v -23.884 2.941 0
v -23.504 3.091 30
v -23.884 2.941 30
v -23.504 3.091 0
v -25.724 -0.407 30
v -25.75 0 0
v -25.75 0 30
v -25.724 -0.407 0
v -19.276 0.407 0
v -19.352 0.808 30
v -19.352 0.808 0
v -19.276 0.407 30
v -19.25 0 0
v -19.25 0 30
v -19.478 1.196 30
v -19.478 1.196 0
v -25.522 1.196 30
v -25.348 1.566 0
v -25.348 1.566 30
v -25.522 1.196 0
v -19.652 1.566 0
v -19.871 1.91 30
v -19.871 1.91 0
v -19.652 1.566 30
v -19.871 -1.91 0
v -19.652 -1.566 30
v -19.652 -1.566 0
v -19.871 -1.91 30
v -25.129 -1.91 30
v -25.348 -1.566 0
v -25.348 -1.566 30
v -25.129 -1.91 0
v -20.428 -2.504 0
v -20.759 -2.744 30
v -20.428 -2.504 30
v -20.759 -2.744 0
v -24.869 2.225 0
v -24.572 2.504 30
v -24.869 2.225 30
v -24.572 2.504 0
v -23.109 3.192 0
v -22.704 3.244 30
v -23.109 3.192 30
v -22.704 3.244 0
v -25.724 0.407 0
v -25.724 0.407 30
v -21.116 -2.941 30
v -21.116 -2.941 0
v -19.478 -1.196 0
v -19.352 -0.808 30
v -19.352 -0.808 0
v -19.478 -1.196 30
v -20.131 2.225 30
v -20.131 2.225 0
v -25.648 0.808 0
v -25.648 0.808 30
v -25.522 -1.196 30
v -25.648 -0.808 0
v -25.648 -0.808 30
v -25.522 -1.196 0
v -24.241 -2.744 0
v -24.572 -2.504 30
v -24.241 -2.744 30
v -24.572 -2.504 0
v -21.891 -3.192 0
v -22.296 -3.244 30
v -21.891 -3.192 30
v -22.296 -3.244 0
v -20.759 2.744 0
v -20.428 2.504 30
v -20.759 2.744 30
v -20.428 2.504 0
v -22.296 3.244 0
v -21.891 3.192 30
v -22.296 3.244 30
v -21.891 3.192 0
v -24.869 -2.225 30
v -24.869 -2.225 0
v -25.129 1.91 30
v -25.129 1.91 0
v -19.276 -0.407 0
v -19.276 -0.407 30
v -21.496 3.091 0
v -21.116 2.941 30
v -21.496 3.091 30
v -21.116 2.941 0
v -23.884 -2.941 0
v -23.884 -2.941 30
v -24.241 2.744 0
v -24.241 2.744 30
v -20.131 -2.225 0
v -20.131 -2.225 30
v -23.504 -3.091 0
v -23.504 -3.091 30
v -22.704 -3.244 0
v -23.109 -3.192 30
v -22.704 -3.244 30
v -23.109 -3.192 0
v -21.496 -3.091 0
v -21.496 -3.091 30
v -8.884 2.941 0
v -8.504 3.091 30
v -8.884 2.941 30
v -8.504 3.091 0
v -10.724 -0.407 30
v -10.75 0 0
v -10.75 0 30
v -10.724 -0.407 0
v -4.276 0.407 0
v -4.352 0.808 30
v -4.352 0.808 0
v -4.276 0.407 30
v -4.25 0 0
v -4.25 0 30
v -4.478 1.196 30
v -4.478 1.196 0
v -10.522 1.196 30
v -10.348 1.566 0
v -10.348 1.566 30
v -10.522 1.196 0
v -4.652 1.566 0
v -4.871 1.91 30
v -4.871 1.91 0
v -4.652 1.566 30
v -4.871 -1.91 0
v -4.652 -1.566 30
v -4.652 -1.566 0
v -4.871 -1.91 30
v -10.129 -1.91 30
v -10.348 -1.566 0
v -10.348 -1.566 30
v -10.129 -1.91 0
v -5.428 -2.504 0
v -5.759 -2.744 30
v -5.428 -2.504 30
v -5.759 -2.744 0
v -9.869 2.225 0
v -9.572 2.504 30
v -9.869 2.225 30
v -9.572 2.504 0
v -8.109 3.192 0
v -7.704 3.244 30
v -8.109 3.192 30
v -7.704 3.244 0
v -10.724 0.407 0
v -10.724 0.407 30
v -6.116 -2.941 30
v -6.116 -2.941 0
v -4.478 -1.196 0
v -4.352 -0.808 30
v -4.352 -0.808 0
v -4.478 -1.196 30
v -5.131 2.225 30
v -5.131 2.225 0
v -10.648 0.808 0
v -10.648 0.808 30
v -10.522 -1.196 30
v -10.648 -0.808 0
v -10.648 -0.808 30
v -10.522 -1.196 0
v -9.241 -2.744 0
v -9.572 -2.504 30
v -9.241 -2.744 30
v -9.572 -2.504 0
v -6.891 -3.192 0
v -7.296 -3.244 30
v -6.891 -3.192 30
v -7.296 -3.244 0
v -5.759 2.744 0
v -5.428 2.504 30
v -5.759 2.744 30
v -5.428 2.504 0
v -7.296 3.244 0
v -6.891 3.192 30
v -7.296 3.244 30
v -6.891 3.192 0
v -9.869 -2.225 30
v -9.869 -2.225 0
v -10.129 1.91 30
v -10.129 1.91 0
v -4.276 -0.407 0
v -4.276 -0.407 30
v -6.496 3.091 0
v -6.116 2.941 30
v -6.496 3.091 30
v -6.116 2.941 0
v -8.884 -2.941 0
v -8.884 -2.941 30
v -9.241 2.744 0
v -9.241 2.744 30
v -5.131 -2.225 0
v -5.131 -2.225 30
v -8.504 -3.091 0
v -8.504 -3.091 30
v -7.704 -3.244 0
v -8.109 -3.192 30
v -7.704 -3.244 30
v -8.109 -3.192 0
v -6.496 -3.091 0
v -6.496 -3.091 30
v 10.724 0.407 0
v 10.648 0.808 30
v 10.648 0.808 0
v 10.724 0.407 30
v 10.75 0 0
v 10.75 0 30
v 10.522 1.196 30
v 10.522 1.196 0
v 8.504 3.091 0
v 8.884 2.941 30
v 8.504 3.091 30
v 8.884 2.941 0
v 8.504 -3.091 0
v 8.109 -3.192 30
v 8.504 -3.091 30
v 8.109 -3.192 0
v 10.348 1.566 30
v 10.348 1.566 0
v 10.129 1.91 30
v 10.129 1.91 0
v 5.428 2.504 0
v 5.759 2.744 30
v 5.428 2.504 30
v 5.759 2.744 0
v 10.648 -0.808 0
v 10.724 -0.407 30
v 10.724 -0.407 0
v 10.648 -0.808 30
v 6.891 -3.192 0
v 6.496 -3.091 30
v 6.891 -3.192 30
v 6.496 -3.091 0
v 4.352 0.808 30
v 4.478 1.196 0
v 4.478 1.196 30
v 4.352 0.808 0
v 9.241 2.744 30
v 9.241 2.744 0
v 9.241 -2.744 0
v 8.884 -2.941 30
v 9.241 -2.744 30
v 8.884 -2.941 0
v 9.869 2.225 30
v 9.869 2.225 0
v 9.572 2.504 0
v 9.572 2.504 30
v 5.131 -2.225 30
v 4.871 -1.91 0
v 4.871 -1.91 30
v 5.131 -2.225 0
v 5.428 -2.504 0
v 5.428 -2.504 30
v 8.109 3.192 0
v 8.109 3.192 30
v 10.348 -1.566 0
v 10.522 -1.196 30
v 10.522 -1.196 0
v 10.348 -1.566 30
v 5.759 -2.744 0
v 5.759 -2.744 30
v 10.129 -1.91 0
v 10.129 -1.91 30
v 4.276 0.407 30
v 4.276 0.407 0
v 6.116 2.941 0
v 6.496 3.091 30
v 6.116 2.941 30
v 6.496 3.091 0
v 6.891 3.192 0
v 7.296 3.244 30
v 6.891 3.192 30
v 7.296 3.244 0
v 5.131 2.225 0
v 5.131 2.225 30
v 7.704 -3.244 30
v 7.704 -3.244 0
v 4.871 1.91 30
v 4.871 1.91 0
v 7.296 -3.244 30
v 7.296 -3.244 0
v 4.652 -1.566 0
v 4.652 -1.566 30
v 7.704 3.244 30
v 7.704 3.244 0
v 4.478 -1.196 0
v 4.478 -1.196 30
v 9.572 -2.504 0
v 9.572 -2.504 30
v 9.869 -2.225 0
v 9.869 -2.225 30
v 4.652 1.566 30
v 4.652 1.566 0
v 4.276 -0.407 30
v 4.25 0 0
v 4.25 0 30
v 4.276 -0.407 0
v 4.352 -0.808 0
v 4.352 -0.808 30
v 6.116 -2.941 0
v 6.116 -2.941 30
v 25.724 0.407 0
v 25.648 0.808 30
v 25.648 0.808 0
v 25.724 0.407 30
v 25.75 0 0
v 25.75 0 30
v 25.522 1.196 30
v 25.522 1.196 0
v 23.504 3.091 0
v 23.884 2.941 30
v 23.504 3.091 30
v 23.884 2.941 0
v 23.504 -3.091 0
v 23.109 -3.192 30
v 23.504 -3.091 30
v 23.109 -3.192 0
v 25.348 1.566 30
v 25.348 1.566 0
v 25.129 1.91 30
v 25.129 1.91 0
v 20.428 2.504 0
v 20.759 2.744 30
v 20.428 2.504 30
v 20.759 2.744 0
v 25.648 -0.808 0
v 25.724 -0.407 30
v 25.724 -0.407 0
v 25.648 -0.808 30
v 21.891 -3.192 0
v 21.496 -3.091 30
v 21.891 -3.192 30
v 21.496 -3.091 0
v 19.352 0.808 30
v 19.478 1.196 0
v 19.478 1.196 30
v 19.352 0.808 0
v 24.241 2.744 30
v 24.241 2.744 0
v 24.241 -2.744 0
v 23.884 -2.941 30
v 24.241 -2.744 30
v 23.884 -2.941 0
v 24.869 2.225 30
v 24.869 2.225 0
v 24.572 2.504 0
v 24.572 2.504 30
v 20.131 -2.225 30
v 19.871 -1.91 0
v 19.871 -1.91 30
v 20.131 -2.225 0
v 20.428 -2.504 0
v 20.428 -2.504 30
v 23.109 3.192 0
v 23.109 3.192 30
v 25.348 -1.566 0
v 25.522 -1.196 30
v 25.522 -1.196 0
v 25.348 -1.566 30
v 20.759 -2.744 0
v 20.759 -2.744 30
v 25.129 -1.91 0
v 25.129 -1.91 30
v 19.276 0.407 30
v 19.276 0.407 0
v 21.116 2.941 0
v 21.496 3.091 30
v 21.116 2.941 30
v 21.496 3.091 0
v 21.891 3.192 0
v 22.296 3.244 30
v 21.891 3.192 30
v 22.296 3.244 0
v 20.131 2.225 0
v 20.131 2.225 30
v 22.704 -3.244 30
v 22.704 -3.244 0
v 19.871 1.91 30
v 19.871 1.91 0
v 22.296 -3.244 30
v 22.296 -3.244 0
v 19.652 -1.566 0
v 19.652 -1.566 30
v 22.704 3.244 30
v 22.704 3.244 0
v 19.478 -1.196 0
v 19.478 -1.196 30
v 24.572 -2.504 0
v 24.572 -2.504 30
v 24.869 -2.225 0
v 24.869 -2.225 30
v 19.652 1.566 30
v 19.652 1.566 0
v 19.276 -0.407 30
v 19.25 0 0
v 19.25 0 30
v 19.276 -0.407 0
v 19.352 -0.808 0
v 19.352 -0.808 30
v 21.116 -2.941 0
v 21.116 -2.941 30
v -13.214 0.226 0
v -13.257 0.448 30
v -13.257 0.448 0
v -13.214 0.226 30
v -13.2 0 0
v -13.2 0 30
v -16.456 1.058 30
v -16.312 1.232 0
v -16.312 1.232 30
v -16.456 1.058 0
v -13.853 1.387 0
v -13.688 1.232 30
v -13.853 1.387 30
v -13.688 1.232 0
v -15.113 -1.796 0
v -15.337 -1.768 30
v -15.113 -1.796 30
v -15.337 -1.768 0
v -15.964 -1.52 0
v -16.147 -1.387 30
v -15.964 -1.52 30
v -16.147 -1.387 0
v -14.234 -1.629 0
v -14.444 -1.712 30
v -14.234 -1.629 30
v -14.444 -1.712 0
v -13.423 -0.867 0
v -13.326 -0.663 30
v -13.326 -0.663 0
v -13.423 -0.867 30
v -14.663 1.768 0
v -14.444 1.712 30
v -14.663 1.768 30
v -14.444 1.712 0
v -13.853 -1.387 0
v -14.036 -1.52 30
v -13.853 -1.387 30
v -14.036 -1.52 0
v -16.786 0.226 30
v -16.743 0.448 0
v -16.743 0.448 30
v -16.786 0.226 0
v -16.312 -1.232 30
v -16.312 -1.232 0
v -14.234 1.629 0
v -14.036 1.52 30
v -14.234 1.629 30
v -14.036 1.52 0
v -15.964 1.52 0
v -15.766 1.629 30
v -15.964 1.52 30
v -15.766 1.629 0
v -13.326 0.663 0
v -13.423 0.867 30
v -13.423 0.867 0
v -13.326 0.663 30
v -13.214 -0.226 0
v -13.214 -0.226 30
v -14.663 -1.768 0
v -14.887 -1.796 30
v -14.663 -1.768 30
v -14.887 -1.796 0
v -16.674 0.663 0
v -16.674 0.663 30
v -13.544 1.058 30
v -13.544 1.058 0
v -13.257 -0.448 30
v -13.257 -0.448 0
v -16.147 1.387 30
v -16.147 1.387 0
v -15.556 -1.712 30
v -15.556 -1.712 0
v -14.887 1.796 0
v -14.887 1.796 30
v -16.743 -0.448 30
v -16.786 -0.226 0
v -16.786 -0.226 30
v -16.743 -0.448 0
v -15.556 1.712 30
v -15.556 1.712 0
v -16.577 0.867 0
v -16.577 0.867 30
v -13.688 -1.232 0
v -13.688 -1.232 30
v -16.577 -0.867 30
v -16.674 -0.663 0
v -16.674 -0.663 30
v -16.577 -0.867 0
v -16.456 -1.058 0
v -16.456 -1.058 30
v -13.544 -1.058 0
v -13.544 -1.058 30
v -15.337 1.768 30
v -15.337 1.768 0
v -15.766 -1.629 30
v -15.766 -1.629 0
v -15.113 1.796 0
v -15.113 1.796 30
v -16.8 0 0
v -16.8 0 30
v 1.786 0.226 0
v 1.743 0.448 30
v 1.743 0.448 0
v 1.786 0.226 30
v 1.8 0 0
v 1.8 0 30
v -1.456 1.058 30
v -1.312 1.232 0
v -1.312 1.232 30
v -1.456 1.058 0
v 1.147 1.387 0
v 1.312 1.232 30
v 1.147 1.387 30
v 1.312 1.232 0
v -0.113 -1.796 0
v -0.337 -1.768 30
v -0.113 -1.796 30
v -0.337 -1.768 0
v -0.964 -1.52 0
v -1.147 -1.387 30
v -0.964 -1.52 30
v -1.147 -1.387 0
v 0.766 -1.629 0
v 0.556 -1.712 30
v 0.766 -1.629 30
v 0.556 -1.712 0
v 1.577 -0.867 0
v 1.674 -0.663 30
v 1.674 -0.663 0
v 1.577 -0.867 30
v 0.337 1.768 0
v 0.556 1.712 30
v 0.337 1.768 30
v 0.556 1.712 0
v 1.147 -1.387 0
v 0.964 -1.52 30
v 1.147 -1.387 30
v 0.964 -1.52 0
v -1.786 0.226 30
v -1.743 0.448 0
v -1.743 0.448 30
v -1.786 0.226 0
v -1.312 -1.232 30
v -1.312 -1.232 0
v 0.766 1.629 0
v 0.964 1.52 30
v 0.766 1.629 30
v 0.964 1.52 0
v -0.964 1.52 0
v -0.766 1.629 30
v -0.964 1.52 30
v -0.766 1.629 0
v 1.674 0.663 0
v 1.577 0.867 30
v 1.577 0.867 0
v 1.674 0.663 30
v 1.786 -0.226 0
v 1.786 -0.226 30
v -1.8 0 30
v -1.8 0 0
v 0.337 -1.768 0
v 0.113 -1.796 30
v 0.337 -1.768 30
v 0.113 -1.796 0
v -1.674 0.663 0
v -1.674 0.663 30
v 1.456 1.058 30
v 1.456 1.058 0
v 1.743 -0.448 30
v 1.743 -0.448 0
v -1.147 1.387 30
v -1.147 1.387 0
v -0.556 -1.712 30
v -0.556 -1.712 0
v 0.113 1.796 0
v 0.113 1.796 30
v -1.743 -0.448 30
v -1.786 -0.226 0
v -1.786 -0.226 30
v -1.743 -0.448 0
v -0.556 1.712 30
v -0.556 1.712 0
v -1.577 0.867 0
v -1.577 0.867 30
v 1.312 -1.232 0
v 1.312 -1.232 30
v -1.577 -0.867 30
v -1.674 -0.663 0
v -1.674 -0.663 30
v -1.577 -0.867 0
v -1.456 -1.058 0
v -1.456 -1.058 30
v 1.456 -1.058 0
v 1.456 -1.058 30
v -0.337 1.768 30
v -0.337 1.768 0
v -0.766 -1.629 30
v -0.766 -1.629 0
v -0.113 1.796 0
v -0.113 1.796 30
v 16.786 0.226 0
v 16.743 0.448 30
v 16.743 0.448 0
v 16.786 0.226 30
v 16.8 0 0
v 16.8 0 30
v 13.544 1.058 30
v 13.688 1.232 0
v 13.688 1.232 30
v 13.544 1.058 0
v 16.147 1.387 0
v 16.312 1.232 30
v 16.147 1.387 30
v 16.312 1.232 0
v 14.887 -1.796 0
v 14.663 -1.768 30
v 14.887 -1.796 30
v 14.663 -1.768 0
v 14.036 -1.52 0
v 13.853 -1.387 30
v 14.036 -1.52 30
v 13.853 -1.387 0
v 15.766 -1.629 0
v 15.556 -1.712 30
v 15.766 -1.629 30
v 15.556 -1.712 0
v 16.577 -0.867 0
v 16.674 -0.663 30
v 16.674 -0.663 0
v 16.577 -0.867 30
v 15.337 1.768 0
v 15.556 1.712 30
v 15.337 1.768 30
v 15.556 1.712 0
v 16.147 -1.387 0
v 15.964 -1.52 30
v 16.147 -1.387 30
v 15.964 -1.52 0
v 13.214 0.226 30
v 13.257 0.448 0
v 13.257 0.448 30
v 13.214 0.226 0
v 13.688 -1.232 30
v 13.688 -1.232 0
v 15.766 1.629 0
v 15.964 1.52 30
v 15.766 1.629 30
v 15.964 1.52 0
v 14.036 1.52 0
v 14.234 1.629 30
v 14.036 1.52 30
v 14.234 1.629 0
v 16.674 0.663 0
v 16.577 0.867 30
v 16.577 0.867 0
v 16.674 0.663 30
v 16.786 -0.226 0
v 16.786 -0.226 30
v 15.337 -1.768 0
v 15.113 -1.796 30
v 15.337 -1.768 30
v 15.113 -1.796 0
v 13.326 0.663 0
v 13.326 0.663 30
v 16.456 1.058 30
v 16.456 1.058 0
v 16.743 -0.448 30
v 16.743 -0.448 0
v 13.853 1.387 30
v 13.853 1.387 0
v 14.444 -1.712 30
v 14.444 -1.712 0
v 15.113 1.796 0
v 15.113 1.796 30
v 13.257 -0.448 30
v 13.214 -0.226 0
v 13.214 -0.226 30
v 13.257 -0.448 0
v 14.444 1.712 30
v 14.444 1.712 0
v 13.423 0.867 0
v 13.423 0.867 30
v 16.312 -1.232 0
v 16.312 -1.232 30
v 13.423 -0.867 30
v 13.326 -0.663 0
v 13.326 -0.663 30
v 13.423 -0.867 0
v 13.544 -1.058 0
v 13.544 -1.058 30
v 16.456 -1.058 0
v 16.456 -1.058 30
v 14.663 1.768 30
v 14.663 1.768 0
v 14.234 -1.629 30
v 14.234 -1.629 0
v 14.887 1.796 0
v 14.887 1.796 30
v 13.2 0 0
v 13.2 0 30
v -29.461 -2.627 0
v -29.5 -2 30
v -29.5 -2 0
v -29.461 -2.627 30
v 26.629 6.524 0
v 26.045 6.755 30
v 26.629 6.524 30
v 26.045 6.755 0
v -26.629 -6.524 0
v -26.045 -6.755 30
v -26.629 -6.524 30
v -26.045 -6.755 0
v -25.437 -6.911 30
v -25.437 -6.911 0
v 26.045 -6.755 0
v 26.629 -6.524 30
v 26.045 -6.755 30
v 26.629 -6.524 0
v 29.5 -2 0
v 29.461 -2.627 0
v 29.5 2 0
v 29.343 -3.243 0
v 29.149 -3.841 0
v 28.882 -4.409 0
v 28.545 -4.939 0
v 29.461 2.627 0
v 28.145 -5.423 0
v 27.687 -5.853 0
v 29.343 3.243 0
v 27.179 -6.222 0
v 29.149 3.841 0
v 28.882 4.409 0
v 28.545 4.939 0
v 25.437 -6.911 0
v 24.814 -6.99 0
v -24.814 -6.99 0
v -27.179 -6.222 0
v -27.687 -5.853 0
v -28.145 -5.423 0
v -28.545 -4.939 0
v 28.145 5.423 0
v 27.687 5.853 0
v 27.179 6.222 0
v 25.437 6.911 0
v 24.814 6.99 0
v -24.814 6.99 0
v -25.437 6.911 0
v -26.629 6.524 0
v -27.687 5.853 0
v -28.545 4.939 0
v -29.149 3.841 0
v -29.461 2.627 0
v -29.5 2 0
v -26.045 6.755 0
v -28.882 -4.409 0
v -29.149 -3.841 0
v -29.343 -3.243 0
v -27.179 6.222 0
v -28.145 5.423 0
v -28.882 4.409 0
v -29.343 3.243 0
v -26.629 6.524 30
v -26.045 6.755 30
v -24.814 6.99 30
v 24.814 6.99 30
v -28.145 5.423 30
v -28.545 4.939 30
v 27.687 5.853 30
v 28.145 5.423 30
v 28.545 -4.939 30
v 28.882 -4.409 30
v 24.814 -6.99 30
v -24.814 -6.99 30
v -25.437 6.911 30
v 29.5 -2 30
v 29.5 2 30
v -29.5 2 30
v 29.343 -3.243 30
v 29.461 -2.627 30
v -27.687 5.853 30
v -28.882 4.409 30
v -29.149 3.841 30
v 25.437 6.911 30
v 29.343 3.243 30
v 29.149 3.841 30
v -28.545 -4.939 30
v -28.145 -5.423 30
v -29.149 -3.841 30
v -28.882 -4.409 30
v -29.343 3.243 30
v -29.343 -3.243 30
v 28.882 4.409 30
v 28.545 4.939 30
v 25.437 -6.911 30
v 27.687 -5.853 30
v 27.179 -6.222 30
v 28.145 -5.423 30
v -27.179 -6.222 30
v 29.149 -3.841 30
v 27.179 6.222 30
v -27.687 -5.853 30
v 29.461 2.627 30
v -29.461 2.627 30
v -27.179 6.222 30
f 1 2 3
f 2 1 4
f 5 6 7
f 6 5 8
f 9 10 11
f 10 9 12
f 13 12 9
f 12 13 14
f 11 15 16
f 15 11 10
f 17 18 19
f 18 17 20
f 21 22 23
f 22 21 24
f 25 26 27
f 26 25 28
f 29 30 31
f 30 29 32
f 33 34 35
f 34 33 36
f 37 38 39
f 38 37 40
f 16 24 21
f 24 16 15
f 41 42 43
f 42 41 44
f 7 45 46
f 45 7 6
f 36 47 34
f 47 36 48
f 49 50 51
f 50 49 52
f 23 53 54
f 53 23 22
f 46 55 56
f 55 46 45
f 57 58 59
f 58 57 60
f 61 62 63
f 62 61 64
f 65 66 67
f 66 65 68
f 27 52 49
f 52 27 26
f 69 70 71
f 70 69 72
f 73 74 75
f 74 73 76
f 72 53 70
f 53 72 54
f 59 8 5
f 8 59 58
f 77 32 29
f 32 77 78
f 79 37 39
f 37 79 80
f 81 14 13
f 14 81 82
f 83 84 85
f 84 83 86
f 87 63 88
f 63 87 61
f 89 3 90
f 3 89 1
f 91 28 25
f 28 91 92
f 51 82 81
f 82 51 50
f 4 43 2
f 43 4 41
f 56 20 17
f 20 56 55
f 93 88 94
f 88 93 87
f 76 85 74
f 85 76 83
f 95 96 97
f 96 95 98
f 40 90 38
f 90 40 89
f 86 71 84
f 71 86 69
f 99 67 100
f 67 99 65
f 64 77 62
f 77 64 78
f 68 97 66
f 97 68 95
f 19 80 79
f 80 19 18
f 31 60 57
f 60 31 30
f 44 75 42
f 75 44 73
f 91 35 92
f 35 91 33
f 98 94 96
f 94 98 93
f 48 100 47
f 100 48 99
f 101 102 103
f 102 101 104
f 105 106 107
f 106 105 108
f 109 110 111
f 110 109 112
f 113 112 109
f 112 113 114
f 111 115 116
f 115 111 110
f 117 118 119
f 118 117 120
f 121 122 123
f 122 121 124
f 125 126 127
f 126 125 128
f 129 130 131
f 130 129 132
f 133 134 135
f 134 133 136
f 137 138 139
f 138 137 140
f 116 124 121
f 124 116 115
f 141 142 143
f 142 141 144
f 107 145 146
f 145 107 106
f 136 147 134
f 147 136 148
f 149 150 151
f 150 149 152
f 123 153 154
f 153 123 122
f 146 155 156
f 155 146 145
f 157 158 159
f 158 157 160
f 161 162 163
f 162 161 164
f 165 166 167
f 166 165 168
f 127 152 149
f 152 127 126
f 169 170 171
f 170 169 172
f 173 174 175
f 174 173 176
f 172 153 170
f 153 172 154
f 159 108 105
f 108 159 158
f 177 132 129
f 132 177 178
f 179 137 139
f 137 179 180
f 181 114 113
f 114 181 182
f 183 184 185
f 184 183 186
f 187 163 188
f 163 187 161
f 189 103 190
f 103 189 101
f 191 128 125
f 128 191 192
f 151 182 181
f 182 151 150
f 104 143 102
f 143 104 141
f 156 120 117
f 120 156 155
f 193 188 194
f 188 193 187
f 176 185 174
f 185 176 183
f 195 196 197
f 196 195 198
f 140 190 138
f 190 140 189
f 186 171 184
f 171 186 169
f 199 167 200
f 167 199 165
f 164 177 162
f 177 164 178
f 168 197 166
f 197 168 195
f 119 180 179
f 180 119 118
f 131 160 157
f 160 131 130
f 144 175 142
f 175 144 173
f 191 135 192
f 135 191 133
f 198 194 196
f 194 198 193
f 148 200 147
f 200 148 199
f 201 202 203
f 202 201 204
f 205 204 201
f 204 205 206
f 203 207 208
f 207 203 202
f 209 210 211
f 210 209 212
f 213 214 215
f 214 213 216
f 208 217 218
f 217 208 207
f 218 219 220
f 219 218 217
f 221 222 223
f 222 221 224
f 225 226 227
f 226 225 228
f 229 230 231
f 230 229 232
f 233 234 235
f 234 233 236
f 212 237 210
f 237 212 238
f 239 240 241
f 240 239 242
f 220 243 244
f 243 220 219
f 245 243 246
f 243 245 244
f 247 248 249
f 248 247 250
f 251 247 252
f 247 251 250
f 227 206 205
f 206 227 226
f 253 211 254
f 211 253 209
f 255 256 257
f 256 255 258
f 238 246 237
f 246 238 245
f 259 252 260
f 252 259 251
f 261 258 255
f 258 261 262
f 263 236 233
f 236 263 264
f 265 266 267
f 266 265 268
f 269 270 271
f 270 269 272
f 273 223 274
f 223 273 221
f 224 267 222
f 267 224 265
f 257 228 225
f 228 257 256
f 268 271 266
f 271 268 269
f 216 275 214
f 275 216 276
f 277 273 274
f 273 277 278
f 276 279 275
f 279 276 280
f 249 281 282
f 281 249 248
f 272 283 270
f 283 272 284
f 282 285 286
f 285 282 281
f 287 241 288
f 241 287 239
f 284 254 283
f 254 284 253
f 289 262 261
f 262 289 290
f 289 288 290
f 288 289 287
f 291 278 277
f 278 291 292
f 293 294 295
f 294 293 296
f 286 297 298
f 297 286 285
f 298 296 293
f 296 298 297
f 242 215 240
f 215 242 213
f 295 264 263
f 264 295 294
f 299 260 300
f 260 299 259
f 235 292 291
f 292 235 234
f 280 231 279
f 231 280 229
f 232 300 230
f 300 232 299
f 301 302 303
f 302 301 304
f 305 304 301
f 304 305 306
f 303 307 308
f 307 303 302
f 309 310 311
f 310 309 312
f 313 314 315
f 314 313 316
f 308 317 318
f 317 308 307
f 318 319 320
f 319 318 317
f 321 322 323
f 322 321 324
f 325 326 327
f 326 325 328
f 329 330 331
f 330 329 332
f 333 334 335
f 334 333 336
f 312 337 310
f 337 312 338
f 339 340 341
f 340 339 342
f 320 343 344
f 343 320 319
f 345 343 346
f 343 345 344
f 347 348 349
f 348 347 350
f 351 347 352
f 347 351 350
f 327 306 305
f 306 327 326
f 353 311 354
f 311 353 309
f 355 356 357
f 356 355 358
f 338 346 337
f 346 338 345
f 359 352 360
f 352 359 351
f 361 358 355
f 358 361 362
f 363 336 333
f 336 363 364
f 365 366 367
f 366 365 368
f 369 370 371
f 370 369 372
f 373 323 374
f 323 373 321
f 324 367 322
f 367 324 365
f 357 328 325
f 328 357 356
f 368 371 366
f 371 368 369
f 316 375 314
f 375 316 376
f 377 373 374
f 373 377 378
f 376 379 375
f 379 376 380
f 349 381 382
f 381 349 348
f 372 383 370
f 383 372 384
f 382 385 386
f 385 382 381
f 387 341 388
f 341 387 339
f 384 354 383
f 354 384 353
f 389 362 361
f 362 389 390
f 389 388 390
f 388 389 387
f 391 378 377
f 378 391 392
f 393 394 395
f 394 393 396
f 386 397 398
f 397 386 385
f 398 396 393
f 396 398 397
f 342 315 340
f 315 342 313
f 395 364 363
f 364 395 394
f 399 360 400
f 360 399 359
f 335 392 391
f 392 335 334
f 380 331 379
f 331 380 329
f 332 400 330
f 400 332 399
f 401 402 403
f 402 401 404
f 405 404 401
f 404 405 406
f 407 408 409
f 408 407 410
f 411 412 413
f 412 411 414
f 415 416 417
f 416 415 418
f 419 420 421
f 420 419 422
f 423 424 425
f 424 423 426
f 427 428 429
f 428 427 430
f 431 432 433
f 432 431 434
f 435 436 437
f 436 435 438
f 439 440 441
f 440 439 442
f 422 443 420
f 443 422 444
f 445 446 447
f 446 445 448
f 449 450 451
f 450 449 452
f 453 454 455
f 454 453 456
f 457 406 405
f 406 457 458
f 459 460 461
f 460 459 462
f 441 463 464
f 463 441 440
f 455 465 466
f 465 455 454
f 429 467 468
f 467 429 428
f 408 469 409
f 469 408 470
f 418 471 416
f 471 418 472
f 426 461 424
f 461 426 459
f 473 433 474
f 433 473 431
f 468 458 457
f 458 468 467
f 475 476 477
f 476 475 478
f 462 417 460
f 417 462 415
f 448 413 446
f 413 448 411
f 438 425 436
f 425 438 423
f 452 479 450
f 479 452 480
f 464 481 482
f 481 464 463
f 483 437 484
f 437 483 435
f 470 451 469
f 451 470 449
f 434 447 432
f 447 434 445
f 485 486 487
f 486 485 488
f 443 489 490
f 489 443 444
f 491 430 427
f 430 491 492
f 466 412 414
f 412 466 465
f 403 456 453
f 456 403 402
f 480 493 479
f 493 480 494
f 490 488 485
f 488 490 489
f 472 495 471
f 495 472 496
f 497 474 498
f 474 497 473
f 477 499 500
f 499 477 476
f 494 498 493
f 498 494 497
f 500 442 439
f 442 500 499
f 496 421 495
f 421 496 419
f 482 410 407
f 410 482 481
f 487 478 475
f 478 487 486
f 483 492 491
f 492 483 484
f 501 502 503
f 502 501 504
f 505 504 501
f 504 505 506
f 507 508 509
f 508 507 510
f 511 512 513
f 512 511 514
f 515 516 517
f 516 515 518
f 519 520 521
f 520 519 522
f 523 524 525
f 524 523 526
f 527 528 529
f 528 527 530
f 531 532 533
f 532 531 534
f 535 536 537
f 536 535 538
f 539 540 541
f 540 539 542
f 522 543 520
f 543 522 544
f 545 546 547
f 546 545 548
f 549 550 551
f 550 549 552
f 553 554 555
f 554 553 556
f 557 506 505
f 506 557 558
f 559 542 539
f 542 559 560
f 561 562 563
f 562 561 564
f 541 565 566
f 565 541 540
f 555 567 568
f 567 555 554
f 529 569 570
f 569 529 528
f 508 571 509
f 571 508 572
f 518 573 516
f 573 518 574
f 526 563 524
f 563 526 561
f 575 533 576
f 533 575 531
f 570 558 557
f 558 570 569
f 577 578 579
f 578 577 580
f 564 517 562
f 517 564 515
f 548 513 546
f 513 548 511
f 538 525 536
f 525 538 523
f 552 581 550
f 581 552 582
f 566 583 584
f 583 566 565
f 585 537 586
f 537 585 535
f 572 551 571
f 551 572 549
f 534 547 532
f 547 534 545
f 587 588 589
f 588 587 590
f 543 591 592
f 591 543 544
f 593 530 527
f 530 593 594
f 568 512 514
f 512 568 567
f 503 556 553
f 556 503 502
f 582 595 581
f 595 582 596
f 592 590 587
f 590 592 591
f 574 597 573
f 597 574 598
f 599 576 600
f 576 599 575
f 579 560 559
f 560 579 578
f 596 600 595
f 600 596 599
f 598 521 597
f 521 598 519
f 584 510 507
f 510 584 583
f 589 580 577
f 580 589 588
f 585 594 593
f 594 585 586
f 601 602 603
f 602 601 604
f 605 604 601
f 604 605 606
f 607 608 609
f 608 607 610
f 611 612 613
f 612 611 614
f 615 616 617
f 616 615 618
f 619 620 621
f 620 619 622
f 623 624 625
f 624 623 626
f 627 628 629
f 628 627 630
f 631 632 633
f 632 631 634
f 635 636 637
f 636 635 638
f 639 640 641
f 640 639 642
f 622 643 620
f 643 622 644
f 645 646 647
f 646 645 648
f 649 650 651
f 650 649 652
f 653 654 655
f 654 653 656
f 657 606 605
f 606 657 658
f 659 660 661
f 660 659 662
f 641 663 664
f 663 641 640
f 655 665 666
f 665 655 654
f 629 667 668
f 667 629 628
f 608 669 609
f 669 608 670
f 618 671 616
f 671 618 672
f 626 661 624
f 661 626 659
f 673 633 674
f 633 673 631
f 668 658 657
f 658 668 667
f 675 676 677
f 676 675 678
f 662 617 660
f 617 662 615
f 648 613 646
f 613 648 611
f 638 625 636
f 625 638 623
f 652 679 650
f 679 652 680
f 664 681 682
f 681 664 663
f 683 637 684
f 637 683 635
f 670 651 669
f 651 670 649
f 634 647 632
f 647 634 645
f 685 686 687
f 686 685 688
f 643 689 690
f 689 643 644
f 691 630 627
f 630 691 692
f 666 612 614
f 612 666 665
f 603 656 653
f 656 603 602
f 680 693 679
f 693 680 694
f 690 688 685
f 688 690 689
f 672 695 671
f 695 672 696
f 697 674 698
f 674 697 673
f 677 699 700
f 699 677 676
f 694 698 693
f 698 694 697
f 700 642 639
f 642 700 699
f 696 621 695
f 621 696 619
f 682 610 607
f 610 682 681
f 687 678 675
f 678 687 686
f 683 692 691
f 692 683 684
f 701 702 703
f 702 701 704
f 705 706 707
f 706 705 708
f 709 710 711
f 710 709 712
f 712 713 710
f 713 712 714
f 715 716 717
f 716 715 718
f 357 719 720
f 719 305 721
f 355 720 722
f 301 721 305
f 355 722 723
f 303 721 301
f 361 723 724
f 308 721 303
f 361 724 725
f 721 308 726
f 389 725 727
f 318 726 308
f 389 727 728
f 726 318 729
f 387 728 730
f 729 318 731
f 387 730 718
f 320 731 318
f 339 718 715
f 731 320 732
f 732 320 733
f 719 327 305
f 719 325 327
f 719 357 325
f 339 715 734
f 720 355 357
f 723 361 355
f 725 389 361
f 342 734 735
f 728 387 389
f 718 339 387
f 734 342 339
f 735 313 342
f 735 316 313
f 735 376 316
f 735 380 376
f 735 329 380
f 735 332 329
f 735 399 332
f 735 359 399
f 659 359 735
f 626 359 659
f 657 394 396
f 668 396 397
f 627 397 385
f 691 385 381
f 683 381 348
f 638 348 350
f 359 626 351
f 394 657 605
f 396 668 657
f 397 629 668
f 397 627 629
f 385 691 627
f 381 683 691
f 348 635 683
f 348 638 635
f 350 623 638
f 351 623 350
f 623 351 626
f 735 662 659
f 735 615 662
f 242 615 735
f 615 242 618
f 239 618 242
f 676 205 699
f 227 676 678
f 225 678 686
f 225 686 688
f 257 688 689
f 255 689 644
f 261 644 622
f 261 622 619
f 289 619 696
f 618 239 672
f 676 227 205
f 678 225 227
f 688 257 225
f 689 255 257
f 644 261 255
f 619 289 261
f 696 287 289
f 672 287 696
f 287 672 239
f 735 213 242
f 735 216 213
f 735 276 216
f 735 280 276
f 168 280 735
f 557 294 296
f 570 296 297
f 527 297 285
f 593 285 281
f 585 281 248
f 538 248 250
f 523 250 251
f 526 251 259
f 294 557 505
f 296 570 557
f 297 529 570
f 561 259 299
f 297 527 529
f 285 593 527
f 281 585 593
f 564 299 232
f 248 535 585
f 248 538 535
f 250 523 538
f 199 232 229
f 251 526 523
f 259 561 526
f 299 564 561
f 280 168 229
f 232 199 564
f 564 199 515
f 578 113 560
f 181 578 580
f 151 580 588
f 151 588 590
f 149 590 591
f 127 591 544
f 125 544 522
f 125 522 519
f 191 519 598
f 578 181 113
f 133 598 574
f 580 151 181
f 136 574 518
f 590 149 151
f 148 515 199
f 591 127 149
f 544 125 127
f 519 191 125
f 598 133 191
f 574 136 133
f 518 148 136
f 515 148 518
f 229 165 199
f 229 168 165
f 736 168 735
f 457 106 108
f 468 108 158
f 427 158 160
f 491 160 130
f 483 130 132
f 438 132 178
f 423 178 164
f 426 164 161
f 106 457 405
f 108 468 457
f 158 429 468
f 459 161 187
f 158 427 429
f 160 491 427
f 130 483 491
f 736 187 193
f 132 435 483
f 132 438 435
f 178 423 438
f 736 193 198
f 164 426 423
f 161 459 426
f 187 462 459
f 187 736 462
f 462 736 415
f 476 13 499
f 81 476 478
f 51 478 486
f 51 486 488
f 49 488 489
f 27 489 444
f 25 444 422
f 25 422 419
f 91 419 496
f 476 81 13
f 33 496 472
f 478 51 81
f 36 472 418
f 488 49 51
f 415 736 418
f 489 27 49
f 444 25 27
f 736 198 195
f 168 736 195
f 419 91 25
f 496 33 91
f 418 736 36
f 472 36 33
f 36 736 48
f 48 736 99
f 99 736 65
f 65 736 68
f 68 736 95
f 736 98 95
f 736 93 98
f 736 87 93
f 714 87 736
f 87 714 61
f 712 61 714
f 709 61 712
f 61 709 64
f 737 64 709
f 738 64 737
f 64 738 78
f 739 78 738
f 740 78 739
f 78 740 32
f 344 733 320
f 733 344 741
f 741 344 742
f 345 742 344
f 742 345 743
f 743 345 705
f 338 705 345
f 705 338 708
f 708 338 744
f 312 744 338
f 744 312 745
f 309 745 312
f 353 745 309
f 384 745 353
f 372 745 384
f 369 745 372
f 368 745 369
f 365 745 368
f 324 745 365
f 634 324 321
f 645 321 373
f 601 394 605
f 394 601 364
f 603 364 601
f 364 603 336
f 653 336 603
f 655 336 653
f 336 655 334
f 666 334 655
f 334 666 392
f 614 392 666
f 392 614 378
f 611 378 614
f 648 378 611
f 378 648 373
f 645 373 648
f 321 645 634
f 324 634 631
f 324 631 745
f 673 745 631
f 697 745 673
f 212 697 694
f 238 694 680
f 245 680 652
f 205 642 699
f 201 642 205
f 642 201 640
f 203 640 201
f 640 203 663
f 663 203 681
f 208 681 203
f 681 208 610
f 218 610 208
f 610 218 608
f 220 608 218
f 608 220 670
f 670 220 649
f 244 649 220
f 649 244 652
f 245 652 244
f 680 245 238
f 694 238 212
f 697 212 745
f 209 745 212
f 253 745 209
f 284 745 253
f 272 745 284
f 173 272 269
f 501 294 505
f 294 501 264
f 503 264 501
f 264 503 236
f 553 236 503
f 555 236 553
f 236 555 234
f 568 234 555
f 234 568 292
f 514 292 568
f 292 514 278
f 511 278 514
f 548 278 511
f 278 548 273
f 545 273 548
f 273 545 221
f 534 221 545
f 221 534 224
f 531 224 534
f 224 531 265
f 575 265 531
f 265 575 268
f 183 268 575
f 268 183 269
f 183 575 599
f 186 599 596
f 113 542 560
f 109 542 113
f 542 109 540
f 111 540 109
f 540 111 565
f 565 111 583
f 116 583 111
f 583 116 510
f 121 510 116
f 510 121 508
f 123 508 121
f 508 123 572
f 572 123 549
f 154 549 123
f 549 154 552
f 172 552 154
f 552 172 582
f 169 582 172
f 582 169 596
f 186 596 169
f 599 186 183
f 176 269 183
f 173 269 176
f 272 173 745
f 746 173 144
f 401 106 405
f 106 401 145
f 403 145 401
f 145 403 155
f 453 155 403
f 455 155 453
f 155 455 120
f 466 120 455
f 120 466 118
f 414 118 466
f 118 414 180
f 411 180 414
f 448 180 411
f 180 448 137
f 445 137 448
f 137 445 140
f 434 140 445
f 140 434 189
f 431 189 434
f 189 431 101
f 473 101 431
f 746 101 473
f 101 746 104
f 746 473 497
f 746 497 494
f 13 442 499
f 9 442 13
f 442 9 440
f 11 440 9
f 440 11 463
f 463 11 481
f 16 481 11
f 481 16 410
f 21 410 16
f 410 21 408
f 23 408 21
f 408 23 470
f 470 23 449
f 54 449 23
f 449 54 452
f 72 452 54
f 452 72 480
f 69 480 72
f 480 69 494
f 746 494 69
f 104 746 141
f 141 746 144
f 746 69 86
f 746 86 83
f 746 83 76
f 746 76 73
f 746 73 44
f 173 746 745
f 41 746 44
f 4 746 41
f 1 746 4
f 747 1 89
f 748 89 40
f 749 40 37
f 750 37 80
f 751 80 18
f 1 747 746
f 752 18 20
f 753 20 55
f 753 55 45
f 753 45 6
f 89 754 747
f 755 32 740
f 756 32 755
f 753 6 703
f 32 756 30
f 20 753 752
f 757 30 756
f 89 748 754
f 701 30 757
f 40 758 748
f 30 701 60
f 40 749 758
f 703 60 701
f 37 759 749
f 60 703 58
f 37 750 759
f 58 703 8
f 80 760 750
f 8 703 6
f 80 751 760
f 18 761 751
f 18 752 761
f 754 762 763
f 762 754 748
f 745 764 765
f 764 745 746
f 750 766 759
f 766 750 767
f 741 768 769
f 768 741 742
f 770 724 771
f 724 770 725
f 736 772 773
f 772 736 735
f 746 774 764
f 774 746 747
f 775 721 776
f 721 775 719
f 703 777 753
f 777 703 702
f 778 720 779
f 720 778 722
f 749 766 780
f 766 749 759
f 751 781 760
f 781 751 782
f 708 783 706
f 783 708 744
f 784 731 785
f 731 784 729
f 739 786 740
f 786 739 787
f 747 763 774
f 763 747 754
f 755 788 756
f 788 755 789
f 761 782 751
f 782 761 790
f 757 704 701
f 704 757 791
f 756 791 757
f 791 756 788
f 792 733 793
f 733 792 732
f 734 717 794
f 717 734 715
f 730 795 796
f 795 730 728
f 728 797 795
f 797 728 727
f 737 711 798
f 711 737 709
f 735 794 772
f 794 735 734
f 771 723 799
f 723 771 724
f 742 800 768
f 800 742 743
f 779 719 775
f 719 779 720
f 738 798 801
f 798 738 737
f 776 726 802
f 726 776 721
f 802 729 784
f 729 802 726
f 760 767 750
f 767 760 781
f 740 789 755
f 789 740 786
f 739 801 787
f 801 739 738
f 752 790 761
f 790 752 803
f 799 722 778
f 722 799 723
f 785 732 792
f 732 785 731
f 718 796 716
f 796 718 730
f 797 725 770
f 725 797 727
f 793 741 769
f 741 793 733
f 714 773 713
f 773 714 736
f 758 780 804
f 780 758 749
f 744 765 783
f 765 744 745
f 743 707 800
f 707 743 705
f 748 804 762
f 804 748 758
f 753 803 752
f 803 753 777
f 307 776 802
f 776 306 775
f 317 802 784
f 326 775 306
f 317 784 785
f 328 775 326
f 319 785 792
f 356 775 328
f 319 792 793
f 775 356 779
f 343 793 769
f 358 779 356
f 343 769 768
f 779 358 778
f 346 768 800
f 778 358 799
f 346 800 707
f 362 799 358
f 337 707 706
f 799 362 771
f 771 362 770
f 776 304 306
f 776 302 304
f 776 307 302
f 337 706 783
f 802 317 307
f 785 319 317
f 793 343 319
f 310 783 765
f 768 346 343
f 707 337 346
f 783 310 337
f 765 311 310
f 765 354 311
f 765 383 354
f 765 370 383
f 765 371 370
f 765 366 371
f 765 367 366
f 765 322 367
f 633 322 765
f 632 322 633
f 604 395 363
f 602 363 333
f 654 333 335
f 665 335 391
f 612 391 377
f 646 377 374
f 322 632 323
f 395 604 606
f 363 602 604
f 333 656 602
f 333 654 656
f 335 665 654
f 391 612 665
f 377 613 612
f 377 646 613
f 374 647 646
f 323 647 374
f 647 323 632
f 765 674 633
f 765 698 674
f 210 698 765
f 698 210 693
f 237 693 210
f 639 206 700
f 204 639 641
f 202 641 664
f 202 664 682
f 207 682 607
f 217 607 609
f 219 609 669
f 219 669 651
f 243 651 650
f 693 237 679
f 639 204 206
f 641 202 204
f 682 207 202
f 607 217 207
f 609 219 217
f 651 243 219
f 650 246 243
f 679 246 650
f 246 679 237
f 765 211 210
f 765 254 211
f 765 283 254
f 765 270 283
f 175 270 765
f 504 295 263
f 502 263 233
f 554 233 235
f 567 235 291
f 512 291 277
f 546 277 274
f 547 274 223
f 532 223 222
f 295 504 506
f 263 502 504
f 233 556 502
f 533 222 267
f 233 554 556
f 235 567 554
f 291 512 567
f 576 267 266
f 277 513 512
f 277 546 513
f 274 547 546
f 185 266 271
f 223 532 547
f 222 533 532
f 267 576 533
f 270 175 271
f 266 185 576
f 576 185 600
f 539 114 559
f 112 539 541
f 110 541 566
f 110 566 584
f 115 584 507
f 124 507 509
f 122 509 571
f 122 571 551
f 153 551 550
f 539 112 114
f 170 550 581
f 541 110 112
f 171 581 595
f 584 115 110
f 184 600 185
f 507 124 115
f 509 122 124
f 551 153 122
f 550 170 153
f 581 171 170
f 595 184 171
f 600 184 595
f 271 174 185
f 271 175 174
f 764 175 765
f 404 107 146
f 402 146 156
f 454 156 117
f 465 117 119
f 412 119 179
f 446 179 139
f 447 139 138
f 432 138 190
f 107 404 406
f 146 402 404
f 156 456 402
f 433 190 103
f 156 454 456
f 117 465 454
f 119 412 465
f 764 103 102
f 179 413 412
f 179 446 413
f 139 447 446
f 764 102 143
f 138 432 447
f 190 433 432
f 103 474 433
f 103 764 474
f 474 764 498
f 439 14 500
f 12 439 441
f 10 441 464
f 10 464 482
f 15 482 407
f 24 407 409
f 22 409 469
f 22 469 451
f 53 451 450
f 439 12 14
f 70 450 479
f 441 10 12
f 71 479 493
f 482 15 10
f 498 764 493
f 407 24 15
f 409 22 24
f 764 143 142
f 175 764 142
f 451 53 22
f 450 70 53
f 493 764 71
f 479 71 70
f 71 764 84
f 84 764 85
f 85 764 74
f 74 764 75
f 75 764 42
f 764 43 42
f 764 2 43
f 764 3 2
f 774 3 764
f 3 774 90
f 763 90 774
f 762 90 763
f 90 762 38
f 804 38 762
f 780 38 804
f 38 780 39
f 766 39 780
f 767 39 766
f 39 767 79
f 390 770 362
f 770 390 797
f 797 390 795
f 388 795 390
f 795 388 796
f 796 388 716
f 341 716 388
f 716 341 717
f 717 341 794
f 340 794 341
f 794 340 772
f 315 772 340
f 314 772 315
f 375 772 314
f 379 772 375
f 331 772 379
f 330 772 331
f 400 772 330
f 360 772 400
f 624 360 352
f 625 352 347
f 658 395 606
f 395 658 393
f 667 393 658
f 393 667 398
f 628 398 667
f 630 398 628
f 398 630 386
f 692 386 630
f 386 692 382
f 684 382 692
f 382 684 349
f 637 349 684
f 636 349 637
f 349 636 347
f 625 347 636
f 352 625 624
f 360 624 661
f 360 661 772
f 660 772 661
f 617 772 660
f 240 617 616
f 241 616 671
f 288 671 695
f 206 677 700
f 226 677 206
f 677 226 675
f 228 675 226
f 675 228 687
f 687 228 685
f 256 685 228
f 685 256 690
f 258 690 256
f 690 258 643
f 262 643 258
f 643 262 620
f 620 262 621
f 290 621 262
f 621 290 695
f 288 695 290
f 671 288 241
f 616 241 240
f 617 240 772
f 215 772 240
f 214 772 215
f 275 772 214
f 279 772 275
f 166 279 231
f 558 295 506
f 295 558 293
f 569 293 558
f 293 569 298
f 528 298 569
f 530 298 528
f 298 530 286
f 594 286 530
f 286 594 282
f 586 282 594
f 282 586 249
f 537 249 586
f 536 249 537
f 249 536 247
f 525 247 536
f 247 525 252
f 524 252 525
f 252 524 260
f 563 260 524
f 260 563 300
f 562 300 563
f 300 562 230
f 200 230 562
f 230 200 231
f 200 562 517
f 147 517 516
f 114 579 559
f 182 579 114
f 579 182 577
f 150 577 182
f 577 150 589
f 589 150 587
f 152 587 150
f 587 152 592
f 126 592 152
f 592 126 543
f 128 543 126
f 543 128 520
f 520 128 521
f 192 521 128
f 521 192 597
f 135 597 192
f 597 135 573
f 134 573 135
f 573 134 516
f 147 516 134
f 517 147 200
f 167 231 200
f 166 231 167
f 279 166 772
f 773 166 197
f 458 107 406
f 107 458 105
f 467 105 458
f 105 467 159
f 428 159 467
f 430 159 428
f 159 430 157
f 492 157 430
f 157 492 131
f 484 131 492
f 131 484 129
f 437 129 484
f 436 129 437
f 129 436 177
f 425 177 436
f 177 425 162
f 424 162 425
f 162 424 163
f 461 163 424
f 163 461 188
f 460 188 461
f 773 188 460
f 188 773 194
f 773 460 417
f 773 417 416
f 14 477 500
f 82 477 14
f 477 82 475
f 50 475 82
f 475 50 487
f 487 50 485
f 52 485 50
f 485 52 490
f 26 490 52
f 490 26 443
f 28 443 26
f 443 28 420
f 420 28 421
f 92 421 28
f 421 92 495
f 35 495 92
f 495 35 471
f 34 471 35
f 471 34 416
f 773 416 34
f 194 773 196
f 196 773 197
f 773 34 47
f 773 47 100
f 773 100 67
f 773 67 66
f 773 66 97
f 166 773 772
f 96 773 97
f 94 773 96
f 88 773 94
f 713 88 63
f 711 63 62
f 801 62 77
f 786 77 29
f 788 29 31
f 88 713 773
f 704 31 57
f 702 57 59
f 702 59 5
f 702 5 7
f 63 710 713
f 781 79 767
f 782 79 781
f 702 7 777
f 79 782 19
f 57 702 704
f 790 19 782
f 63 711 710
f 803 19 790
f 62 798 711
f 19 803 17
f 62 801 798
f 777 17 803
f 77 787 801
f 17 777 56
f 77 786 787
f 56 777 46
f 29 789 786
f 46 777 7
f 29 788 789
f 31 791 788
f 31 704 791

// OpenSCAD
$fn = 50;


difference() {
	union() {
		hull() {
			translate(v = [-24.5000000000, 2.0000000000, 0]) {
				cylinder(h = 30, r = 5);
			}
			translate(v = [24.5000000000, 2.0000000000, 0]) {
				cylinder(h = 30, r = 5);
			}
			translate(v = [-24.5000000000, -2.0000000000, 0]) {
				cylinder(h = 30, r = 5);
			}
			translate(v = [24.5000000000, -2.0000000000, 0]) {
				cylinder(h = 30, r = 5);
			}
		}
	}
	union() {
		translate(v = [-22.5000000000, 0.0000000000, 0]) {
			translate(v = [0, 0, -100]) {
				cylinder(h = 200, r = 3.2500000000);
			}
		}
		translate(v = [-7.5000000000, 0.0000000000, 0]) {
			translate(v = [0, 0, -100]) {
				cylinder(h = 200, r = 3.2500000000);
			}
		}
		translate(v = [7.5000000000, 0.0000000000, 0]) {
			translate(v = [0, 0, -100]) {
				cylinder(h = 200, r = 3.2500000000);
			}
		}
		translate(v = [22.5000000000, 0.0000000000, 0]) {
			translate(v = [0, 0, -100]) {
				cylinder(h = 200, r = 3.2500000000);
			}
		}
		translate(v = [-22.5000000000, 0.0000000000, 0]) {
			translate(v = [0, 0, -100]) {
				cylinder(h = 200, r = 1.8000000000);
			}
		}
		translate(v = [-15.0000000000, 0.0000000000, 0]) {
			translate(v = [0, 0, -100]) {
				cylinder(h = 200, r = 1.8000000000);
			}
		}
		translate(v = [-7.5000000000, 0.0000000000, 0]) {
			translate(v = [0, 0, -100]) {
				cylinder(h = 200, r = 1.8000000000);
			}
		}
		translate(v = [0, 0, -100]) {
			cylinder(h = 200, r = 1.8000000000);
		}
		translate(v = [7.5000000000, 0.0000000000, 0]) {
			translate(v = [0, 0, -100]) {
				cylinder(h = 200, r = 1.8000000000);
			}
		}
		translate(v = [15.0000000000, 0.0000000000, 0]) {
			translate(v = [0, 0, -100]) {
				cylinder(h = 200, r = 1.8000000000);
			}
		}
		translate(v = [22.5000000000, 0.0000000000, 0]) {
			translate(v = [0, 0, -100]) {
				cylinder(h = 200, r = 1.8000000000);
			}
		}
	}
}
